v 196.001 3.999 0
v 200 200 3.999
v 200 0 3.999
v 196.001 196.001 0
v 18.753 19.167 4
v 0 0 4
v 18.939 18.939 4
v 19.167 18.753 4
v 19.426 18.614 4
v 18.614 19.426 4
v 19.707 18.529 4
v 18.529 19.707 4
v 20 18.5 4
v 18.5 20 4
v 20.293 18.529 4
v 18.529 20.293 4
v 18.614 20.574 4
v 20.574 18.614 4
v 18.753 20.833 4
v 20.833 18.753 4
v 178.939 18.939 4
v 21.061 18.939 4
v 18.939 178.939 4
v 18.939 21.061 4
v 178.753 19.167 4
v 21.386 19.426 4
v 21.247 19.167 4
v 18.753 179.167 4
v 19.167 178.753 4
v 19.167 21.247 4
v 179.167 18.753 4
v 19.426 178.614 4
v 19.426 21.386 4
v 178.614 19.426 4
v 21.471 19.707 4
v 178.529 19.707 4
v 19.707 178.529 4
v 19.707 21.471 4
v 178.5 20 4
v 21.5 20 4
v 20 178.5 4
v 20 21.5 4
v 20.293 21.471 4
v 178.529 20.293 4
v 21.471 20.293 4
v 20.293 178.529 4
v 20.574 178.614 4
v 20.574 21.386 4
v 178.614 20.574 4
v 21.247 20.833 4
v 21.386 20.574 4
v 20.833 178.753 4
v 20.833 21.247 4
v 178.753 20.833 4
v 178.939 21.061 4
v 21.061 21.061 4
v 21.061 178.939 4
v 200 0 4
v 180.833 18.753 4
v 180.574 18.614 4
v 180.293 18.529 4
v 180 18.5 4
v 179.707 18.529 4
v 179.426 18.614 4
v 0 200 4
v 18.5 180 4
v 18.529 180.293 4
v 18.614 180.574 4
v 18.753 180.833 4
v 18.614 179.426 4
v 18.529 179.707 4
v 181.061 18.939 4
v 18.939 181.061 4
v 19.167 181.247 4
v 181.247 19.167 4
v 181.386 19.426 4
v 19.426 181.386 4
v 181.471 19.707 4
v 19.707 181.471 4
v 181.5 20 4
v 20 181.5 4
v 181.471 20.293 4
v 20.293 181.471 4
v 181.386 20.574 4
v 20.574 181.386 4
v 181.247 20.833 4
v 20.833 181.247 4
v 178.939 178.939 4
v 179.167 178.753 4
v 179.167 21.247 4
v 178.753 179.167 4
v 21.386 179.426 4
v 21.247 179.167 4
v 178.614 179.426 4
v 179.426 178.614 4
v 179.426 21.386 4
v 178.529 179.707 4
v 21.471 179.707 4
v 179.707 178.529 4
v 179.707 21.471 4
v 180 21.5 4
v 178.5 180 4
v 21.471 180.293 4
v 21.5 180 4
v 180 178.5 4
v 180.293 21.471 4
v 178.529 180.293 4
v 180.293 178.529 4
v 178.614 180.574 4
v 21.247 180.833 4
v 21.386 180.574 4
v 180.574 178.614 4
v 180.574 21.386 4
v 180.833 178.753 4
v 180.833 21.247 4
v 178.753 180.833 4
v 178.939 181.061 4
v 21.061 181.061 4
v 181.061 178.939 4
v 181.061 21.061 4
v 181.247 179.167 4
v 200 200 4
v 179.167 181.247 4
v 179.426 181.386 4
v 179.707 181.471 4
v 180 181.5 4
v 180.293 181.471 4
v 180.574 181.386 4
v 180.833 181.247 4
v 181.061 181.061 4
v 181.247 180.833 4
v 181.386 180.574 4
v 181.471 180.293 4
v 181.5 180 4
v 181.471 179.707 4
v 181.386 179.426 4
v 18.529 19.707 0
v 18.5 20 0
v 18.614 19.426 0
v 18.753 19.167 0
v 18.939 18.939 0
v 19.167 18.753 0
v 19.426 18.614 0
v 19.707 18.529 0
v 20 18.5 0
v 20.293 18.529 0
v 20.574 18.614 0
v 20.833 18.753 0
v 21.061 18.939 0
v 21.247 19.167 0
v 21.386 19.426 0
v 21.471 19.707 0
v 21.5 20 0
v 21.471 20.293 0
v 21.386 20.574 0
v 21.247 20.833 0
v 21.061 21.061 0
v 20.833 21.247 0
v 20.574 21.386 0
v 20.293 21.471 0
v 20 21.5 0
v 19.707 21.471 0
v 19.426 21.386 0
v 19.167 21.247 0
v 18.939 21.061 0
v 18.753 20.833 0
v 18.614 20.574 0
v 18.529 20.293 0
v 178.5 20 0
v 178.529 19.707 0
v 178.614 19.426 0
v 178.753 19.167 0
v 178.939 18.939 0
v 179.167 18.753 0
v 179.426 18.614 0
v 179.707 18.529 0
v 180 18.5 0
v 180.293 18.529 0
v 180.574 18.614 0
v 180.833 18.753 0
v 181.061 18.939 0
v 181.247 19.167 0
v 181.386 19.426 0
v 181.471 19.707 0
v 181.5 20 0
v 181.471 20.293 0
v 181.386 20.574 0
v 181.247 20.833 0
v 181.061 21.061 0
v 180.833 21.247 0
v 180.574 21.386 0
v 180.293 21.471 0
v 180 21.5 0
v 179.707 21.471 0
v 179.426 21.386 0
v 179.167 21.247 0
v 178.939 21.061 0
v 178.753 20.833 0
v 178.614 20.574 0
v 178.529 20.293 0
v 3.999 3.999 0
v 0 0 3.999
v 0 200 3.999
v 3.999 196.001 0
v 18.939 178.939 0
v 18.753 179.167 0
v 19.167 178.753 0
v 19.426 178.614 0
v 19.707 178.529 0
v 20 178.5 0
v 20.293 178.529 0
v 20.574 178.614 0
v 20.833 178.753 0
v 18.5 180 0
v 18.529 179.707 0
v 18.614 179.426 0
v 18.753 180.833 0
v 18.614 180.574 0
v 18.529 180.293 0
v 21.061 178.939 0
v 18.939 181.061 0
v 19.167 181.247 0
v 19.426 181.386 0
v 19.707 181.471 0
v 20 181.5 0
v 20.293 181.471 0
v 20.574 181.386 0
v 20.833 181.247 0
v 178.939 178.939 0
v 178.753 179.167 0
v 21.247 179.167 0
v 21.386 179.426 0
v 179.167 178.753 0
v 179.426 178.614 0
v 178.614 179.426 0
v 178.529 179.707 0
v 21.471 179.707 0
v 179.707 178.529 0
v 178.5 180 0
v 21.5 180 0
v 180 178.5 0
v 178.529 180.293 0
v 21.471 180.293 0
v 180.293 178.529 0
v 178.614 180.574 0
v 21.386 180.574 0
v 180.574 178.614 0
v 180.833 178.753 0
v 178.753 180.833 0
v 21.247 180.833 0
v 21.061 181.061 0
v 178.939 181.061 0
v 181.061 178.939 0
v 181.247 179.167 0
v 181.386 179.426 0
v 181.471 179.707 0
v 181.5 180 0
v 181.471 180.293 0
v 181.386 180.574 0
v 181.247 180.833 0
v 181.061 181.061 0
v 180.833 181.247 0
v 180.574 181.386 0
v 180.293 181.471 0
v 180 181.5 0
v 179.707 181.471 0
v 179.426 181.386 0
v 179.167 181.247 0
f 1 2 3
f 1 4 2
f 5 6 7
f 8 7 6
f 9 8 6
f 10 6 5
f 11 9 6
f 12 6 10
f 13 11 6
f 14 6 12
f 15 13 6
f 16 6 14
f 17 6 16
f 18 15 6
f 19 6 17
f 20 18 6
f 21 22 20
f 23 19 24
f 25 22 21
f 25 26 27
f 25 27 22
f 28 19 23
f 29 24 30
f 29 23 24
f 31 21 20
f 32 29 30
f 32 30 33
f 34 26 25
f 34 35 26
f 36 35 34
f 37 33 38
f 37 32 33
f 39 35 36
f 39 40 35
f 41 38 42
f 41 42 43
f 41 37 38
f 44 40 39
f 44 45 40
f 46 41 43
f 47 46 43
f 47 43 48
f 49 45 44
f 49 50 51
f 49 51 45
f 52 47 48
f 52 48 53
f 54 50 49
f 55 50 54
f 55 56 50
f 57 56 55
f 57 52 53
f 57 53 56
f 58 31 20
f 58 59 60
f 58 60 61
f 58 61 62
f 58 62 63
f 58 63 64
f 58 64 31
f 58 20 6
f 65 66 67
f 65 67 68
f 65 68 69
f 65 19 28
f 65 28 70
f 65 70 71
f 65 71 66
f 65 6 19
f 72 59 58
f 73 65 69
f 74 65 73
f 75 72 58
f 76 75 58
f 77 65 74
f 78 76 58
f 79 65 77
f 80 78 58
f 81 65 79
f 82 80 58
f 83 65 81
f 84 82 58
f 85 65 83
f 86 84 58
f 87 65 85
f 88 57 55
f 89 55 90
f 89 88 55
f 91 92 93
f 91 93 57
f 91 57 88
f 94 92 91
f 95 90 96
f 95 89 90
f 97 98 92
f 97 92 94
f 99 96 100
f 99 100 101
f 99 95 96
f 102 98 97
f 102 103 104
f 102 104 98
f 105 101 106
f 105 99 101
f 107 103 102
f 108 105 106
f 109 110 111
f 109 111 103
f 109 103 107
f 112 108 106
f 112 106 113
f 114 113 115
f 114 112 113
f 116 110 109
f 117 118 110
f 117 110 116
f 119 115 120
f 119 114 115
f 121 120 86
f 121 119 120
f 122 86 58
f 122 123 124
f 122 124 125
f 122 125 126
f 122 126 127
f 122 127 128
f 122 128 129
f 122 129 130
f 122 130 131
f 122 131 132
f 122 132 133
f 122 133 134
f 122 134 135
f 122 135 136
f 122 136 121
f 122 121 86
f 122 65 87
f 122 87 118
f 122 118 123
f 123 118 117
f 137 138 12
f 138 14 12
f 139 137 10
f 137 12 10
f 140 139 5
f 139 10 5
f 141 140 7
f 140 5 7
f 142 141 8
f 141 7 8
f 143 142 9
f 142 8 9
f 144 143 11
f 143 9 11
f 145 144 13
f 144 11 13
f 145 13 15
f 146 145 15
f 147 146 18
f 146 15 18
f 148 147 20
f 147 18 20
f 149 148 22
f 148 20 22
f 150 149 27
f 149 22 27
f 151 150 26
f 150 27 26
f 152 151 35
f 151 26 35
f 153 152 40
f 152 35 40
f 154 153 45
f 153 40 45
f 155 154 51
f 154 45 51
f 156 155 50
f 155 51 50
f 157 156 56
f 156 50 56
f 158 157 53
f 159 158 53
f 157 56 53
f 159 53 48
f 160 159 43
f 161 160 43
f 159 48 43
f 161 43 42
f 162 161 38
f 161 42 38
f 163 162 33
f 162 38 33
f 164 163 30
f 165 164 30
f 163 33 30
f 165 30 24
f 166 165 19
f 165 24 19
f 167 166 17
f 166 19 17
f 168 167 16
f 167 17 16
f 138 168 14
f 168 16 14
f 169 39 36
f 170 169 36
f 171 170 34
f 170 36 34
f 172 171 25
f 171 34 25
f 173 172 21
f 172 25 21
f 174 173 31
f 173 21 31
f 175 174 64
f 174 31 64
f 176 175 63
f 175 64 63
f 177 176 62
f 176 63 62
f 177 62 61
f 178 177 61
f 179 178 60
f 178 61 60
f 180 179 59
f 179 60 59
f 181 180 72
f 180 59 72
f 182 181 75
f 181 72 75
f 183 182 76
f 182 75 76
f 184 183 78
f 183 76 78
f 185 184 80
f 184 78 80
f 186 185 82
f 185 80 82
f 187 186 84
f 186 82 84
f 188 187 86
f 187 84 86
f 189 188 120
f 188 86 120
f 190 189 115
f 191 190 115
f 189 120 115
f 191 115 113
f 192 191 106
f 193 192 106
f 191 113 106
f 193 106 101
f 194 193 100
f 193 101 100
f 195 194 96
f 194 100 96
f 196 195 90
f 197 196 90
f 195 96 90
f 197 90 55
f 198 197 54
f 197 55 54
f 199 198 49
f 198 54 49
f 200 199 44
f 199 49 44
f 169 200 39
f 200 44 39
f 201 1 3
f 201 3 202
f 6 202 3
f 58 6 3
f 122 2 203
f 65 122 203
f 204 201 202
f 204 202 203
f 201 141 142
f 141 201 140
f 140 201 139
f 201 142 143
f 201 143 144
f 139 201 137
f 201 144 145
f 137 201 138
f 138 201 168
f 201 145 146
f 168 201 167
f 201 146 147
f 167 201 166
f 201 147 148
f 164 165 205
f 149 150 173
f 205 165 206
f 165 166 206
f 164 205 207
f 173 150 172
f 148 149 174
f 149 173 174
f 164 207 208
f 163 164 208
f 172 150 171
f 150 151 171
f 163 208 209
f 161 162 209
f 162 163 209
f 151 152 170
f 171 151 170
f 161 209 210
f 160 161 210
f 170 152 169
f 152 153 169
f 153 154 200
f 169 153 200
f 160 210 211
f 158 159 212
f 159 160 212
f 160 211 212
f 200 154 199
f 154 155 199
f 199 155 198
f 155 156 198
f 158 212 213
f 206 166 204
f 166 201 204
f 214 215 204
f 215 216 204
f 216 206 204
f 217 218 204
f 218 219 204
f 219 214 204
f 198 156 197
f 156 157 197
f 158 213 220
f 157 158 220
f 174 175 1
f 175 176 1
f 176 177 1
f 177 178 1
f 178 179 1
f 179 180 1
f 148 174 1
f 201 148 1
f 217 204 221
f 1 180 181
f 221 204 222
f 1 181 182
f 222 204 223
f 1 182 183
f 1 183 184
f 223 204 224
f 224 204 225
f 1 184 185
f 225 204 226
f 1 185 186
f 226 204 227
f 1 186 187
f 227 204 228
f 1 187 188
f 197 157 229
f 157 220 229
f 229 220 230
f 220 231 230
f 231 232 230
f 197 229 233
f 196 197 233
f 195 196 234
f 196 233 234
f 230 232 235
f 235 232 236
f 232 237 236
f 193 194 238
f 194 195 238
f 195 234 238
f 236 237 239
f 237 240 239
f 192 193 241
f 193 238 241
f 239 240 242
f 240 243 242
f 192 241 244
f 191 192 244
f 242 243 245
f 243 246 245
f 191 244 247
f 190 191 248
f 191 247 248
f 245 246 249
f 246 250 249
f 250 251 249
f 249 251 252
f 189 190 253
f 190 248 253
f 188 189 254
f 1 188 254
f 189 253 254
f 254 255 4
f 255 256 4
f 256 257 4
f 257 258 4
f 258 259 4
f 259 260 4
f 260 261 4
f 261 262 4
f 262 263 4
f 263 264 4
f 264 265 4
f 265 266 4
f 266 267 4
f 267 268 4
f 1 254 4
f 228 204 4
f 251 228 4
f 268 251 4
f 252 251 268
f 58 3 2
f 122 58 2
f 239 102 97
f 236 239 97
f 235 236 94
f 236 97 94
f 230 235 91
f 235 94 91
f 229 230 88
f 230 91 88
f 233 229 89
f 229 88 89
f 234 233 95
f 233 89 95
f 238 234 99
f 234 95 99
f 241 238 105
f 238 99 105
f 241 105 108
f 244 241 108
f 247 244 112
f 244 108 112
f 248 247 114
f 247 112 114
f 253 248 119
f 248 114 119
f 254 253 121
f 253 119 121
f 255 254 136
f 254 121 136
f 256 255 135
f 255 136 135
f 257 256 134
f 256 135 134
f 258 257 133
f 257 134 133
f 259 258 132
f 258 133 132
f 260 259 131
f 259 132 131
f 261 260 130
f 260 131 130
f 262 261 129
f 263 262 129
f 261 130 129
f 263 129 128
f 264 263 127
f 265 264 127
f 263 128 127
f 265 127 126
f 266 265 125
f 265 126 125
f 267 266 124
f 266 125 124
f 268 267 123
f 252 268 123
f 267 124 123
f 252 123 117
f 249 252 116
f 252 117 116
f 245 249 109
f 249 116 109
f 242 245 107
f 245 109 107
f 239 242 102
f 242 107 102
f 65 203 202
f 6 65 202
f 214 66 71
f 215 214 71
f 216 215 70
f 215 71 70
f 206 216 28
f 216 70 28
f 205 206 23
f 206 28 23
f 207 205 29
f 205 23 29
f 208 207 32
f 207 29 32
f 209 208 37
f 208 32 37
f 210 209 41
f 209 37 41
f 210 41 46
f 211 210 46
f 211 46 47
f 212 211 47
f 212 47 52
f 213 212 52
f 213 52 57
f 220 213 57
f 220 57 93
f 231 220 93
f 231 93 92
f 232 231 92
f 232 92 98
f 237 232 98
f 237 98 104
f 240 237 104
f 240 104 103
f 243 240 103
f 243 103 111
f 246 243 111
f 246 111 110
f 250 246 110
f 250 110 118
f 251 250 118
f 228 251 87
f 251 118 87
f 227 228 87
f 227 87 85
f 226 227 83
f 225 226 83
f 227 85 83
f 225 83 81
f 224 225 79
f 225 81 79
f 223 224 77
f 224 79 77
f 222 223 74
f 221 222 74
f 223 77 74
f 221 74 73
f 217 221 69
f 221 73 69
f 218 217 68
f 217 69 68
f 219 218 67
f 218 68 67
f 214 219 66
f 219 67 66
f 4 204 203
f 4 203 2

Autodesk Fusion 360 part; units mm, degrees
sketch "Esquisse1" plane through (0, 0, 0) normal (0, 0, 1) x (1, 0, 0)
  line L0 (0, 0) -> (200, 0)
  line L1 (200, 0) -> (200, 200)
  line L2 (200, 200) -> (0, 200)
  line L3 (0, 200) -> (0, 0)
  dimension "d18" = 200
  dimension "d19" = 200
extrude "Extrusion1" add sketch "Esquisse1" along normal blind 4
chamfer "Chanfrein1" distance 4 angle 45 1 faces at (66.6667, 133.3333, 0)
sketch "Esquisse2" plane through (0, 0, 4) normal (0, 0, 1) x (-1, 0, 0)
  circle A0 centre (-20, -180) radius 1.5
  circle A1 centre (-180, -180) radius 1.5
  circle A2 centre (-180, -20) radius 1.5
  circle A3 centre (-20, -20) radius 1.5
  line L0 (0, 0) -> (-20, -20)
  line L1 (-200, 0) -> (-180, -20)
  line L2 (-200, 0) -> (-297.1716, 0) construction
  line L3 (0, -200) -> (-20, -180)
  line L4 (-200, -200) -> (-180, -180)
  line L5 (-200, -200) -> (-297.1716, -200) construction
  line L6 (0, -200) -> (0, 0)
  line L7 (0, 0) -> (-200, 0)
  line L8 (-200, 0) -> (-200, -200)
  line L9 (-200, -200) -> (0, -200)
  dimension "d10" = 3
  dimension "d11" = 3
  dimension "d12" = 3
  dimension "d13" = 3
  dimension "d20" = 28.2843
  dimension "d22" = 45
  dimension "d23" = 28.2843
  dimension "d24" = 28.2843
  dimension "d25" = 28.2843
  dimension "d26" = 45
extrude "Extrusion2" cut sketch "Esquisse2" against normal blind 14 contours A0 | A1 | A2 | A3
thread "Filetage1" "ISO Metric profile 4.0 M4x0.7 M4x0.7 6H" major diameter 4.1095 minor diameter 3.332 pitch 0.7 angle 60 resizes the face on face at (21.4536, 179.6299, 2.6667)
thread "Filetage2" "ISO Metric profile 4.0 M4x0.7 M4x0.7 6H" major diameter 4.1095 minor diameter 3.332 pitch 0.7 angle 60 resizes the face on face at (21.4925, 20.1494, 1.3333)
thread "Filetage3" "ISO Metric profile 4.0 M4x0.7 M4x0.7 6H" major diameter 4.1095 minor diameter 3.332 pitch 0.7 angle 60 resizes the face on face at (179.3157, 18.6652, 2.6667)
thread "Filetage4" "ISO Metric profile 4.0 M4x0.7 M4x0.7 6H" major diameter 4.1095 minor diameter 3.332 pitch 0.7 angle 60 resizes the face on face at (179.1244, 178.7821, 1.3333)
equation "d20 = ( sqrt(800) ) * 1 mm"
equation "d23 = ( sqrt(800) ) * 1 mm"
equation "d24 = ( sqrt(800) ) * 1 mm"
equation "d25 = ( sqrt(800) ) * 1 mm"
